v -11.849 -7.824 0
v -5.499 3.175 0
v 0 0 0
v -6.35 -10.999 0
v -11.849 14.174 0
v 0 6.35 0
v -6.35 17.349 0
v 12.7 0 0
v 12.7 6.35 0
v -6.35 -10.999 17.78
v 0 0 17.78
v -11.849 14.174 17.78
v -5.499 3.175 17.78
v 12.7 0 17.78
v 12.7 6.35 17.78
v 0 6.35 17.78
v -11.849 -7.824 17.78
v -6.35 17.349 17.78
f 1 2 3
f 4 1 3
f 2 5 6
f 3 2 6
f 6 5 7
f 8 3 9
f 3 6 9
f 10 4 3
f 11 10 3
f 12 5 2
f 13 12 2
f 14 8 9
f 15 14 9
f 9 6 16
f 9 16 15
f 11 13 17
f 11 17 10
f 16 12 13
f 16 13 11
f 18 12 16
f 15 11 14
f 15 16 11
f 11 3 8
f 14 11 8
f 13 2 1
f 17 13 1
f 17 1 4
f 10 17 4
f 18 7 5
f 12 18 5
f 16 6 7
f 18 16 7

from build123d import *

# Parameters (mm, degrees)
F0_W     = 12.7
F0_H     = 6.35
F1_DEPTH = 17.78


with BuildPart() as f1:
    # F0 (on Top) → F1 (new body)
    with BuildSketch(Plane.XY):
        with Locations((6.35, 3.175)):
            Rectangle(F0_W, F0_H)
        Polygon((0, 0), (0, 6.35), (-6.35, 17.348523), (-11.849261, 14.173523), (-5.499261, 3.175), align=None)
        Polygon((-6.35, -10.998523), (0, 0), (-5.499261, 3.175), (-11.849261, -7.823523), align=None)
    extrude(amount=F1_DEPTH)


solid = f1.part
